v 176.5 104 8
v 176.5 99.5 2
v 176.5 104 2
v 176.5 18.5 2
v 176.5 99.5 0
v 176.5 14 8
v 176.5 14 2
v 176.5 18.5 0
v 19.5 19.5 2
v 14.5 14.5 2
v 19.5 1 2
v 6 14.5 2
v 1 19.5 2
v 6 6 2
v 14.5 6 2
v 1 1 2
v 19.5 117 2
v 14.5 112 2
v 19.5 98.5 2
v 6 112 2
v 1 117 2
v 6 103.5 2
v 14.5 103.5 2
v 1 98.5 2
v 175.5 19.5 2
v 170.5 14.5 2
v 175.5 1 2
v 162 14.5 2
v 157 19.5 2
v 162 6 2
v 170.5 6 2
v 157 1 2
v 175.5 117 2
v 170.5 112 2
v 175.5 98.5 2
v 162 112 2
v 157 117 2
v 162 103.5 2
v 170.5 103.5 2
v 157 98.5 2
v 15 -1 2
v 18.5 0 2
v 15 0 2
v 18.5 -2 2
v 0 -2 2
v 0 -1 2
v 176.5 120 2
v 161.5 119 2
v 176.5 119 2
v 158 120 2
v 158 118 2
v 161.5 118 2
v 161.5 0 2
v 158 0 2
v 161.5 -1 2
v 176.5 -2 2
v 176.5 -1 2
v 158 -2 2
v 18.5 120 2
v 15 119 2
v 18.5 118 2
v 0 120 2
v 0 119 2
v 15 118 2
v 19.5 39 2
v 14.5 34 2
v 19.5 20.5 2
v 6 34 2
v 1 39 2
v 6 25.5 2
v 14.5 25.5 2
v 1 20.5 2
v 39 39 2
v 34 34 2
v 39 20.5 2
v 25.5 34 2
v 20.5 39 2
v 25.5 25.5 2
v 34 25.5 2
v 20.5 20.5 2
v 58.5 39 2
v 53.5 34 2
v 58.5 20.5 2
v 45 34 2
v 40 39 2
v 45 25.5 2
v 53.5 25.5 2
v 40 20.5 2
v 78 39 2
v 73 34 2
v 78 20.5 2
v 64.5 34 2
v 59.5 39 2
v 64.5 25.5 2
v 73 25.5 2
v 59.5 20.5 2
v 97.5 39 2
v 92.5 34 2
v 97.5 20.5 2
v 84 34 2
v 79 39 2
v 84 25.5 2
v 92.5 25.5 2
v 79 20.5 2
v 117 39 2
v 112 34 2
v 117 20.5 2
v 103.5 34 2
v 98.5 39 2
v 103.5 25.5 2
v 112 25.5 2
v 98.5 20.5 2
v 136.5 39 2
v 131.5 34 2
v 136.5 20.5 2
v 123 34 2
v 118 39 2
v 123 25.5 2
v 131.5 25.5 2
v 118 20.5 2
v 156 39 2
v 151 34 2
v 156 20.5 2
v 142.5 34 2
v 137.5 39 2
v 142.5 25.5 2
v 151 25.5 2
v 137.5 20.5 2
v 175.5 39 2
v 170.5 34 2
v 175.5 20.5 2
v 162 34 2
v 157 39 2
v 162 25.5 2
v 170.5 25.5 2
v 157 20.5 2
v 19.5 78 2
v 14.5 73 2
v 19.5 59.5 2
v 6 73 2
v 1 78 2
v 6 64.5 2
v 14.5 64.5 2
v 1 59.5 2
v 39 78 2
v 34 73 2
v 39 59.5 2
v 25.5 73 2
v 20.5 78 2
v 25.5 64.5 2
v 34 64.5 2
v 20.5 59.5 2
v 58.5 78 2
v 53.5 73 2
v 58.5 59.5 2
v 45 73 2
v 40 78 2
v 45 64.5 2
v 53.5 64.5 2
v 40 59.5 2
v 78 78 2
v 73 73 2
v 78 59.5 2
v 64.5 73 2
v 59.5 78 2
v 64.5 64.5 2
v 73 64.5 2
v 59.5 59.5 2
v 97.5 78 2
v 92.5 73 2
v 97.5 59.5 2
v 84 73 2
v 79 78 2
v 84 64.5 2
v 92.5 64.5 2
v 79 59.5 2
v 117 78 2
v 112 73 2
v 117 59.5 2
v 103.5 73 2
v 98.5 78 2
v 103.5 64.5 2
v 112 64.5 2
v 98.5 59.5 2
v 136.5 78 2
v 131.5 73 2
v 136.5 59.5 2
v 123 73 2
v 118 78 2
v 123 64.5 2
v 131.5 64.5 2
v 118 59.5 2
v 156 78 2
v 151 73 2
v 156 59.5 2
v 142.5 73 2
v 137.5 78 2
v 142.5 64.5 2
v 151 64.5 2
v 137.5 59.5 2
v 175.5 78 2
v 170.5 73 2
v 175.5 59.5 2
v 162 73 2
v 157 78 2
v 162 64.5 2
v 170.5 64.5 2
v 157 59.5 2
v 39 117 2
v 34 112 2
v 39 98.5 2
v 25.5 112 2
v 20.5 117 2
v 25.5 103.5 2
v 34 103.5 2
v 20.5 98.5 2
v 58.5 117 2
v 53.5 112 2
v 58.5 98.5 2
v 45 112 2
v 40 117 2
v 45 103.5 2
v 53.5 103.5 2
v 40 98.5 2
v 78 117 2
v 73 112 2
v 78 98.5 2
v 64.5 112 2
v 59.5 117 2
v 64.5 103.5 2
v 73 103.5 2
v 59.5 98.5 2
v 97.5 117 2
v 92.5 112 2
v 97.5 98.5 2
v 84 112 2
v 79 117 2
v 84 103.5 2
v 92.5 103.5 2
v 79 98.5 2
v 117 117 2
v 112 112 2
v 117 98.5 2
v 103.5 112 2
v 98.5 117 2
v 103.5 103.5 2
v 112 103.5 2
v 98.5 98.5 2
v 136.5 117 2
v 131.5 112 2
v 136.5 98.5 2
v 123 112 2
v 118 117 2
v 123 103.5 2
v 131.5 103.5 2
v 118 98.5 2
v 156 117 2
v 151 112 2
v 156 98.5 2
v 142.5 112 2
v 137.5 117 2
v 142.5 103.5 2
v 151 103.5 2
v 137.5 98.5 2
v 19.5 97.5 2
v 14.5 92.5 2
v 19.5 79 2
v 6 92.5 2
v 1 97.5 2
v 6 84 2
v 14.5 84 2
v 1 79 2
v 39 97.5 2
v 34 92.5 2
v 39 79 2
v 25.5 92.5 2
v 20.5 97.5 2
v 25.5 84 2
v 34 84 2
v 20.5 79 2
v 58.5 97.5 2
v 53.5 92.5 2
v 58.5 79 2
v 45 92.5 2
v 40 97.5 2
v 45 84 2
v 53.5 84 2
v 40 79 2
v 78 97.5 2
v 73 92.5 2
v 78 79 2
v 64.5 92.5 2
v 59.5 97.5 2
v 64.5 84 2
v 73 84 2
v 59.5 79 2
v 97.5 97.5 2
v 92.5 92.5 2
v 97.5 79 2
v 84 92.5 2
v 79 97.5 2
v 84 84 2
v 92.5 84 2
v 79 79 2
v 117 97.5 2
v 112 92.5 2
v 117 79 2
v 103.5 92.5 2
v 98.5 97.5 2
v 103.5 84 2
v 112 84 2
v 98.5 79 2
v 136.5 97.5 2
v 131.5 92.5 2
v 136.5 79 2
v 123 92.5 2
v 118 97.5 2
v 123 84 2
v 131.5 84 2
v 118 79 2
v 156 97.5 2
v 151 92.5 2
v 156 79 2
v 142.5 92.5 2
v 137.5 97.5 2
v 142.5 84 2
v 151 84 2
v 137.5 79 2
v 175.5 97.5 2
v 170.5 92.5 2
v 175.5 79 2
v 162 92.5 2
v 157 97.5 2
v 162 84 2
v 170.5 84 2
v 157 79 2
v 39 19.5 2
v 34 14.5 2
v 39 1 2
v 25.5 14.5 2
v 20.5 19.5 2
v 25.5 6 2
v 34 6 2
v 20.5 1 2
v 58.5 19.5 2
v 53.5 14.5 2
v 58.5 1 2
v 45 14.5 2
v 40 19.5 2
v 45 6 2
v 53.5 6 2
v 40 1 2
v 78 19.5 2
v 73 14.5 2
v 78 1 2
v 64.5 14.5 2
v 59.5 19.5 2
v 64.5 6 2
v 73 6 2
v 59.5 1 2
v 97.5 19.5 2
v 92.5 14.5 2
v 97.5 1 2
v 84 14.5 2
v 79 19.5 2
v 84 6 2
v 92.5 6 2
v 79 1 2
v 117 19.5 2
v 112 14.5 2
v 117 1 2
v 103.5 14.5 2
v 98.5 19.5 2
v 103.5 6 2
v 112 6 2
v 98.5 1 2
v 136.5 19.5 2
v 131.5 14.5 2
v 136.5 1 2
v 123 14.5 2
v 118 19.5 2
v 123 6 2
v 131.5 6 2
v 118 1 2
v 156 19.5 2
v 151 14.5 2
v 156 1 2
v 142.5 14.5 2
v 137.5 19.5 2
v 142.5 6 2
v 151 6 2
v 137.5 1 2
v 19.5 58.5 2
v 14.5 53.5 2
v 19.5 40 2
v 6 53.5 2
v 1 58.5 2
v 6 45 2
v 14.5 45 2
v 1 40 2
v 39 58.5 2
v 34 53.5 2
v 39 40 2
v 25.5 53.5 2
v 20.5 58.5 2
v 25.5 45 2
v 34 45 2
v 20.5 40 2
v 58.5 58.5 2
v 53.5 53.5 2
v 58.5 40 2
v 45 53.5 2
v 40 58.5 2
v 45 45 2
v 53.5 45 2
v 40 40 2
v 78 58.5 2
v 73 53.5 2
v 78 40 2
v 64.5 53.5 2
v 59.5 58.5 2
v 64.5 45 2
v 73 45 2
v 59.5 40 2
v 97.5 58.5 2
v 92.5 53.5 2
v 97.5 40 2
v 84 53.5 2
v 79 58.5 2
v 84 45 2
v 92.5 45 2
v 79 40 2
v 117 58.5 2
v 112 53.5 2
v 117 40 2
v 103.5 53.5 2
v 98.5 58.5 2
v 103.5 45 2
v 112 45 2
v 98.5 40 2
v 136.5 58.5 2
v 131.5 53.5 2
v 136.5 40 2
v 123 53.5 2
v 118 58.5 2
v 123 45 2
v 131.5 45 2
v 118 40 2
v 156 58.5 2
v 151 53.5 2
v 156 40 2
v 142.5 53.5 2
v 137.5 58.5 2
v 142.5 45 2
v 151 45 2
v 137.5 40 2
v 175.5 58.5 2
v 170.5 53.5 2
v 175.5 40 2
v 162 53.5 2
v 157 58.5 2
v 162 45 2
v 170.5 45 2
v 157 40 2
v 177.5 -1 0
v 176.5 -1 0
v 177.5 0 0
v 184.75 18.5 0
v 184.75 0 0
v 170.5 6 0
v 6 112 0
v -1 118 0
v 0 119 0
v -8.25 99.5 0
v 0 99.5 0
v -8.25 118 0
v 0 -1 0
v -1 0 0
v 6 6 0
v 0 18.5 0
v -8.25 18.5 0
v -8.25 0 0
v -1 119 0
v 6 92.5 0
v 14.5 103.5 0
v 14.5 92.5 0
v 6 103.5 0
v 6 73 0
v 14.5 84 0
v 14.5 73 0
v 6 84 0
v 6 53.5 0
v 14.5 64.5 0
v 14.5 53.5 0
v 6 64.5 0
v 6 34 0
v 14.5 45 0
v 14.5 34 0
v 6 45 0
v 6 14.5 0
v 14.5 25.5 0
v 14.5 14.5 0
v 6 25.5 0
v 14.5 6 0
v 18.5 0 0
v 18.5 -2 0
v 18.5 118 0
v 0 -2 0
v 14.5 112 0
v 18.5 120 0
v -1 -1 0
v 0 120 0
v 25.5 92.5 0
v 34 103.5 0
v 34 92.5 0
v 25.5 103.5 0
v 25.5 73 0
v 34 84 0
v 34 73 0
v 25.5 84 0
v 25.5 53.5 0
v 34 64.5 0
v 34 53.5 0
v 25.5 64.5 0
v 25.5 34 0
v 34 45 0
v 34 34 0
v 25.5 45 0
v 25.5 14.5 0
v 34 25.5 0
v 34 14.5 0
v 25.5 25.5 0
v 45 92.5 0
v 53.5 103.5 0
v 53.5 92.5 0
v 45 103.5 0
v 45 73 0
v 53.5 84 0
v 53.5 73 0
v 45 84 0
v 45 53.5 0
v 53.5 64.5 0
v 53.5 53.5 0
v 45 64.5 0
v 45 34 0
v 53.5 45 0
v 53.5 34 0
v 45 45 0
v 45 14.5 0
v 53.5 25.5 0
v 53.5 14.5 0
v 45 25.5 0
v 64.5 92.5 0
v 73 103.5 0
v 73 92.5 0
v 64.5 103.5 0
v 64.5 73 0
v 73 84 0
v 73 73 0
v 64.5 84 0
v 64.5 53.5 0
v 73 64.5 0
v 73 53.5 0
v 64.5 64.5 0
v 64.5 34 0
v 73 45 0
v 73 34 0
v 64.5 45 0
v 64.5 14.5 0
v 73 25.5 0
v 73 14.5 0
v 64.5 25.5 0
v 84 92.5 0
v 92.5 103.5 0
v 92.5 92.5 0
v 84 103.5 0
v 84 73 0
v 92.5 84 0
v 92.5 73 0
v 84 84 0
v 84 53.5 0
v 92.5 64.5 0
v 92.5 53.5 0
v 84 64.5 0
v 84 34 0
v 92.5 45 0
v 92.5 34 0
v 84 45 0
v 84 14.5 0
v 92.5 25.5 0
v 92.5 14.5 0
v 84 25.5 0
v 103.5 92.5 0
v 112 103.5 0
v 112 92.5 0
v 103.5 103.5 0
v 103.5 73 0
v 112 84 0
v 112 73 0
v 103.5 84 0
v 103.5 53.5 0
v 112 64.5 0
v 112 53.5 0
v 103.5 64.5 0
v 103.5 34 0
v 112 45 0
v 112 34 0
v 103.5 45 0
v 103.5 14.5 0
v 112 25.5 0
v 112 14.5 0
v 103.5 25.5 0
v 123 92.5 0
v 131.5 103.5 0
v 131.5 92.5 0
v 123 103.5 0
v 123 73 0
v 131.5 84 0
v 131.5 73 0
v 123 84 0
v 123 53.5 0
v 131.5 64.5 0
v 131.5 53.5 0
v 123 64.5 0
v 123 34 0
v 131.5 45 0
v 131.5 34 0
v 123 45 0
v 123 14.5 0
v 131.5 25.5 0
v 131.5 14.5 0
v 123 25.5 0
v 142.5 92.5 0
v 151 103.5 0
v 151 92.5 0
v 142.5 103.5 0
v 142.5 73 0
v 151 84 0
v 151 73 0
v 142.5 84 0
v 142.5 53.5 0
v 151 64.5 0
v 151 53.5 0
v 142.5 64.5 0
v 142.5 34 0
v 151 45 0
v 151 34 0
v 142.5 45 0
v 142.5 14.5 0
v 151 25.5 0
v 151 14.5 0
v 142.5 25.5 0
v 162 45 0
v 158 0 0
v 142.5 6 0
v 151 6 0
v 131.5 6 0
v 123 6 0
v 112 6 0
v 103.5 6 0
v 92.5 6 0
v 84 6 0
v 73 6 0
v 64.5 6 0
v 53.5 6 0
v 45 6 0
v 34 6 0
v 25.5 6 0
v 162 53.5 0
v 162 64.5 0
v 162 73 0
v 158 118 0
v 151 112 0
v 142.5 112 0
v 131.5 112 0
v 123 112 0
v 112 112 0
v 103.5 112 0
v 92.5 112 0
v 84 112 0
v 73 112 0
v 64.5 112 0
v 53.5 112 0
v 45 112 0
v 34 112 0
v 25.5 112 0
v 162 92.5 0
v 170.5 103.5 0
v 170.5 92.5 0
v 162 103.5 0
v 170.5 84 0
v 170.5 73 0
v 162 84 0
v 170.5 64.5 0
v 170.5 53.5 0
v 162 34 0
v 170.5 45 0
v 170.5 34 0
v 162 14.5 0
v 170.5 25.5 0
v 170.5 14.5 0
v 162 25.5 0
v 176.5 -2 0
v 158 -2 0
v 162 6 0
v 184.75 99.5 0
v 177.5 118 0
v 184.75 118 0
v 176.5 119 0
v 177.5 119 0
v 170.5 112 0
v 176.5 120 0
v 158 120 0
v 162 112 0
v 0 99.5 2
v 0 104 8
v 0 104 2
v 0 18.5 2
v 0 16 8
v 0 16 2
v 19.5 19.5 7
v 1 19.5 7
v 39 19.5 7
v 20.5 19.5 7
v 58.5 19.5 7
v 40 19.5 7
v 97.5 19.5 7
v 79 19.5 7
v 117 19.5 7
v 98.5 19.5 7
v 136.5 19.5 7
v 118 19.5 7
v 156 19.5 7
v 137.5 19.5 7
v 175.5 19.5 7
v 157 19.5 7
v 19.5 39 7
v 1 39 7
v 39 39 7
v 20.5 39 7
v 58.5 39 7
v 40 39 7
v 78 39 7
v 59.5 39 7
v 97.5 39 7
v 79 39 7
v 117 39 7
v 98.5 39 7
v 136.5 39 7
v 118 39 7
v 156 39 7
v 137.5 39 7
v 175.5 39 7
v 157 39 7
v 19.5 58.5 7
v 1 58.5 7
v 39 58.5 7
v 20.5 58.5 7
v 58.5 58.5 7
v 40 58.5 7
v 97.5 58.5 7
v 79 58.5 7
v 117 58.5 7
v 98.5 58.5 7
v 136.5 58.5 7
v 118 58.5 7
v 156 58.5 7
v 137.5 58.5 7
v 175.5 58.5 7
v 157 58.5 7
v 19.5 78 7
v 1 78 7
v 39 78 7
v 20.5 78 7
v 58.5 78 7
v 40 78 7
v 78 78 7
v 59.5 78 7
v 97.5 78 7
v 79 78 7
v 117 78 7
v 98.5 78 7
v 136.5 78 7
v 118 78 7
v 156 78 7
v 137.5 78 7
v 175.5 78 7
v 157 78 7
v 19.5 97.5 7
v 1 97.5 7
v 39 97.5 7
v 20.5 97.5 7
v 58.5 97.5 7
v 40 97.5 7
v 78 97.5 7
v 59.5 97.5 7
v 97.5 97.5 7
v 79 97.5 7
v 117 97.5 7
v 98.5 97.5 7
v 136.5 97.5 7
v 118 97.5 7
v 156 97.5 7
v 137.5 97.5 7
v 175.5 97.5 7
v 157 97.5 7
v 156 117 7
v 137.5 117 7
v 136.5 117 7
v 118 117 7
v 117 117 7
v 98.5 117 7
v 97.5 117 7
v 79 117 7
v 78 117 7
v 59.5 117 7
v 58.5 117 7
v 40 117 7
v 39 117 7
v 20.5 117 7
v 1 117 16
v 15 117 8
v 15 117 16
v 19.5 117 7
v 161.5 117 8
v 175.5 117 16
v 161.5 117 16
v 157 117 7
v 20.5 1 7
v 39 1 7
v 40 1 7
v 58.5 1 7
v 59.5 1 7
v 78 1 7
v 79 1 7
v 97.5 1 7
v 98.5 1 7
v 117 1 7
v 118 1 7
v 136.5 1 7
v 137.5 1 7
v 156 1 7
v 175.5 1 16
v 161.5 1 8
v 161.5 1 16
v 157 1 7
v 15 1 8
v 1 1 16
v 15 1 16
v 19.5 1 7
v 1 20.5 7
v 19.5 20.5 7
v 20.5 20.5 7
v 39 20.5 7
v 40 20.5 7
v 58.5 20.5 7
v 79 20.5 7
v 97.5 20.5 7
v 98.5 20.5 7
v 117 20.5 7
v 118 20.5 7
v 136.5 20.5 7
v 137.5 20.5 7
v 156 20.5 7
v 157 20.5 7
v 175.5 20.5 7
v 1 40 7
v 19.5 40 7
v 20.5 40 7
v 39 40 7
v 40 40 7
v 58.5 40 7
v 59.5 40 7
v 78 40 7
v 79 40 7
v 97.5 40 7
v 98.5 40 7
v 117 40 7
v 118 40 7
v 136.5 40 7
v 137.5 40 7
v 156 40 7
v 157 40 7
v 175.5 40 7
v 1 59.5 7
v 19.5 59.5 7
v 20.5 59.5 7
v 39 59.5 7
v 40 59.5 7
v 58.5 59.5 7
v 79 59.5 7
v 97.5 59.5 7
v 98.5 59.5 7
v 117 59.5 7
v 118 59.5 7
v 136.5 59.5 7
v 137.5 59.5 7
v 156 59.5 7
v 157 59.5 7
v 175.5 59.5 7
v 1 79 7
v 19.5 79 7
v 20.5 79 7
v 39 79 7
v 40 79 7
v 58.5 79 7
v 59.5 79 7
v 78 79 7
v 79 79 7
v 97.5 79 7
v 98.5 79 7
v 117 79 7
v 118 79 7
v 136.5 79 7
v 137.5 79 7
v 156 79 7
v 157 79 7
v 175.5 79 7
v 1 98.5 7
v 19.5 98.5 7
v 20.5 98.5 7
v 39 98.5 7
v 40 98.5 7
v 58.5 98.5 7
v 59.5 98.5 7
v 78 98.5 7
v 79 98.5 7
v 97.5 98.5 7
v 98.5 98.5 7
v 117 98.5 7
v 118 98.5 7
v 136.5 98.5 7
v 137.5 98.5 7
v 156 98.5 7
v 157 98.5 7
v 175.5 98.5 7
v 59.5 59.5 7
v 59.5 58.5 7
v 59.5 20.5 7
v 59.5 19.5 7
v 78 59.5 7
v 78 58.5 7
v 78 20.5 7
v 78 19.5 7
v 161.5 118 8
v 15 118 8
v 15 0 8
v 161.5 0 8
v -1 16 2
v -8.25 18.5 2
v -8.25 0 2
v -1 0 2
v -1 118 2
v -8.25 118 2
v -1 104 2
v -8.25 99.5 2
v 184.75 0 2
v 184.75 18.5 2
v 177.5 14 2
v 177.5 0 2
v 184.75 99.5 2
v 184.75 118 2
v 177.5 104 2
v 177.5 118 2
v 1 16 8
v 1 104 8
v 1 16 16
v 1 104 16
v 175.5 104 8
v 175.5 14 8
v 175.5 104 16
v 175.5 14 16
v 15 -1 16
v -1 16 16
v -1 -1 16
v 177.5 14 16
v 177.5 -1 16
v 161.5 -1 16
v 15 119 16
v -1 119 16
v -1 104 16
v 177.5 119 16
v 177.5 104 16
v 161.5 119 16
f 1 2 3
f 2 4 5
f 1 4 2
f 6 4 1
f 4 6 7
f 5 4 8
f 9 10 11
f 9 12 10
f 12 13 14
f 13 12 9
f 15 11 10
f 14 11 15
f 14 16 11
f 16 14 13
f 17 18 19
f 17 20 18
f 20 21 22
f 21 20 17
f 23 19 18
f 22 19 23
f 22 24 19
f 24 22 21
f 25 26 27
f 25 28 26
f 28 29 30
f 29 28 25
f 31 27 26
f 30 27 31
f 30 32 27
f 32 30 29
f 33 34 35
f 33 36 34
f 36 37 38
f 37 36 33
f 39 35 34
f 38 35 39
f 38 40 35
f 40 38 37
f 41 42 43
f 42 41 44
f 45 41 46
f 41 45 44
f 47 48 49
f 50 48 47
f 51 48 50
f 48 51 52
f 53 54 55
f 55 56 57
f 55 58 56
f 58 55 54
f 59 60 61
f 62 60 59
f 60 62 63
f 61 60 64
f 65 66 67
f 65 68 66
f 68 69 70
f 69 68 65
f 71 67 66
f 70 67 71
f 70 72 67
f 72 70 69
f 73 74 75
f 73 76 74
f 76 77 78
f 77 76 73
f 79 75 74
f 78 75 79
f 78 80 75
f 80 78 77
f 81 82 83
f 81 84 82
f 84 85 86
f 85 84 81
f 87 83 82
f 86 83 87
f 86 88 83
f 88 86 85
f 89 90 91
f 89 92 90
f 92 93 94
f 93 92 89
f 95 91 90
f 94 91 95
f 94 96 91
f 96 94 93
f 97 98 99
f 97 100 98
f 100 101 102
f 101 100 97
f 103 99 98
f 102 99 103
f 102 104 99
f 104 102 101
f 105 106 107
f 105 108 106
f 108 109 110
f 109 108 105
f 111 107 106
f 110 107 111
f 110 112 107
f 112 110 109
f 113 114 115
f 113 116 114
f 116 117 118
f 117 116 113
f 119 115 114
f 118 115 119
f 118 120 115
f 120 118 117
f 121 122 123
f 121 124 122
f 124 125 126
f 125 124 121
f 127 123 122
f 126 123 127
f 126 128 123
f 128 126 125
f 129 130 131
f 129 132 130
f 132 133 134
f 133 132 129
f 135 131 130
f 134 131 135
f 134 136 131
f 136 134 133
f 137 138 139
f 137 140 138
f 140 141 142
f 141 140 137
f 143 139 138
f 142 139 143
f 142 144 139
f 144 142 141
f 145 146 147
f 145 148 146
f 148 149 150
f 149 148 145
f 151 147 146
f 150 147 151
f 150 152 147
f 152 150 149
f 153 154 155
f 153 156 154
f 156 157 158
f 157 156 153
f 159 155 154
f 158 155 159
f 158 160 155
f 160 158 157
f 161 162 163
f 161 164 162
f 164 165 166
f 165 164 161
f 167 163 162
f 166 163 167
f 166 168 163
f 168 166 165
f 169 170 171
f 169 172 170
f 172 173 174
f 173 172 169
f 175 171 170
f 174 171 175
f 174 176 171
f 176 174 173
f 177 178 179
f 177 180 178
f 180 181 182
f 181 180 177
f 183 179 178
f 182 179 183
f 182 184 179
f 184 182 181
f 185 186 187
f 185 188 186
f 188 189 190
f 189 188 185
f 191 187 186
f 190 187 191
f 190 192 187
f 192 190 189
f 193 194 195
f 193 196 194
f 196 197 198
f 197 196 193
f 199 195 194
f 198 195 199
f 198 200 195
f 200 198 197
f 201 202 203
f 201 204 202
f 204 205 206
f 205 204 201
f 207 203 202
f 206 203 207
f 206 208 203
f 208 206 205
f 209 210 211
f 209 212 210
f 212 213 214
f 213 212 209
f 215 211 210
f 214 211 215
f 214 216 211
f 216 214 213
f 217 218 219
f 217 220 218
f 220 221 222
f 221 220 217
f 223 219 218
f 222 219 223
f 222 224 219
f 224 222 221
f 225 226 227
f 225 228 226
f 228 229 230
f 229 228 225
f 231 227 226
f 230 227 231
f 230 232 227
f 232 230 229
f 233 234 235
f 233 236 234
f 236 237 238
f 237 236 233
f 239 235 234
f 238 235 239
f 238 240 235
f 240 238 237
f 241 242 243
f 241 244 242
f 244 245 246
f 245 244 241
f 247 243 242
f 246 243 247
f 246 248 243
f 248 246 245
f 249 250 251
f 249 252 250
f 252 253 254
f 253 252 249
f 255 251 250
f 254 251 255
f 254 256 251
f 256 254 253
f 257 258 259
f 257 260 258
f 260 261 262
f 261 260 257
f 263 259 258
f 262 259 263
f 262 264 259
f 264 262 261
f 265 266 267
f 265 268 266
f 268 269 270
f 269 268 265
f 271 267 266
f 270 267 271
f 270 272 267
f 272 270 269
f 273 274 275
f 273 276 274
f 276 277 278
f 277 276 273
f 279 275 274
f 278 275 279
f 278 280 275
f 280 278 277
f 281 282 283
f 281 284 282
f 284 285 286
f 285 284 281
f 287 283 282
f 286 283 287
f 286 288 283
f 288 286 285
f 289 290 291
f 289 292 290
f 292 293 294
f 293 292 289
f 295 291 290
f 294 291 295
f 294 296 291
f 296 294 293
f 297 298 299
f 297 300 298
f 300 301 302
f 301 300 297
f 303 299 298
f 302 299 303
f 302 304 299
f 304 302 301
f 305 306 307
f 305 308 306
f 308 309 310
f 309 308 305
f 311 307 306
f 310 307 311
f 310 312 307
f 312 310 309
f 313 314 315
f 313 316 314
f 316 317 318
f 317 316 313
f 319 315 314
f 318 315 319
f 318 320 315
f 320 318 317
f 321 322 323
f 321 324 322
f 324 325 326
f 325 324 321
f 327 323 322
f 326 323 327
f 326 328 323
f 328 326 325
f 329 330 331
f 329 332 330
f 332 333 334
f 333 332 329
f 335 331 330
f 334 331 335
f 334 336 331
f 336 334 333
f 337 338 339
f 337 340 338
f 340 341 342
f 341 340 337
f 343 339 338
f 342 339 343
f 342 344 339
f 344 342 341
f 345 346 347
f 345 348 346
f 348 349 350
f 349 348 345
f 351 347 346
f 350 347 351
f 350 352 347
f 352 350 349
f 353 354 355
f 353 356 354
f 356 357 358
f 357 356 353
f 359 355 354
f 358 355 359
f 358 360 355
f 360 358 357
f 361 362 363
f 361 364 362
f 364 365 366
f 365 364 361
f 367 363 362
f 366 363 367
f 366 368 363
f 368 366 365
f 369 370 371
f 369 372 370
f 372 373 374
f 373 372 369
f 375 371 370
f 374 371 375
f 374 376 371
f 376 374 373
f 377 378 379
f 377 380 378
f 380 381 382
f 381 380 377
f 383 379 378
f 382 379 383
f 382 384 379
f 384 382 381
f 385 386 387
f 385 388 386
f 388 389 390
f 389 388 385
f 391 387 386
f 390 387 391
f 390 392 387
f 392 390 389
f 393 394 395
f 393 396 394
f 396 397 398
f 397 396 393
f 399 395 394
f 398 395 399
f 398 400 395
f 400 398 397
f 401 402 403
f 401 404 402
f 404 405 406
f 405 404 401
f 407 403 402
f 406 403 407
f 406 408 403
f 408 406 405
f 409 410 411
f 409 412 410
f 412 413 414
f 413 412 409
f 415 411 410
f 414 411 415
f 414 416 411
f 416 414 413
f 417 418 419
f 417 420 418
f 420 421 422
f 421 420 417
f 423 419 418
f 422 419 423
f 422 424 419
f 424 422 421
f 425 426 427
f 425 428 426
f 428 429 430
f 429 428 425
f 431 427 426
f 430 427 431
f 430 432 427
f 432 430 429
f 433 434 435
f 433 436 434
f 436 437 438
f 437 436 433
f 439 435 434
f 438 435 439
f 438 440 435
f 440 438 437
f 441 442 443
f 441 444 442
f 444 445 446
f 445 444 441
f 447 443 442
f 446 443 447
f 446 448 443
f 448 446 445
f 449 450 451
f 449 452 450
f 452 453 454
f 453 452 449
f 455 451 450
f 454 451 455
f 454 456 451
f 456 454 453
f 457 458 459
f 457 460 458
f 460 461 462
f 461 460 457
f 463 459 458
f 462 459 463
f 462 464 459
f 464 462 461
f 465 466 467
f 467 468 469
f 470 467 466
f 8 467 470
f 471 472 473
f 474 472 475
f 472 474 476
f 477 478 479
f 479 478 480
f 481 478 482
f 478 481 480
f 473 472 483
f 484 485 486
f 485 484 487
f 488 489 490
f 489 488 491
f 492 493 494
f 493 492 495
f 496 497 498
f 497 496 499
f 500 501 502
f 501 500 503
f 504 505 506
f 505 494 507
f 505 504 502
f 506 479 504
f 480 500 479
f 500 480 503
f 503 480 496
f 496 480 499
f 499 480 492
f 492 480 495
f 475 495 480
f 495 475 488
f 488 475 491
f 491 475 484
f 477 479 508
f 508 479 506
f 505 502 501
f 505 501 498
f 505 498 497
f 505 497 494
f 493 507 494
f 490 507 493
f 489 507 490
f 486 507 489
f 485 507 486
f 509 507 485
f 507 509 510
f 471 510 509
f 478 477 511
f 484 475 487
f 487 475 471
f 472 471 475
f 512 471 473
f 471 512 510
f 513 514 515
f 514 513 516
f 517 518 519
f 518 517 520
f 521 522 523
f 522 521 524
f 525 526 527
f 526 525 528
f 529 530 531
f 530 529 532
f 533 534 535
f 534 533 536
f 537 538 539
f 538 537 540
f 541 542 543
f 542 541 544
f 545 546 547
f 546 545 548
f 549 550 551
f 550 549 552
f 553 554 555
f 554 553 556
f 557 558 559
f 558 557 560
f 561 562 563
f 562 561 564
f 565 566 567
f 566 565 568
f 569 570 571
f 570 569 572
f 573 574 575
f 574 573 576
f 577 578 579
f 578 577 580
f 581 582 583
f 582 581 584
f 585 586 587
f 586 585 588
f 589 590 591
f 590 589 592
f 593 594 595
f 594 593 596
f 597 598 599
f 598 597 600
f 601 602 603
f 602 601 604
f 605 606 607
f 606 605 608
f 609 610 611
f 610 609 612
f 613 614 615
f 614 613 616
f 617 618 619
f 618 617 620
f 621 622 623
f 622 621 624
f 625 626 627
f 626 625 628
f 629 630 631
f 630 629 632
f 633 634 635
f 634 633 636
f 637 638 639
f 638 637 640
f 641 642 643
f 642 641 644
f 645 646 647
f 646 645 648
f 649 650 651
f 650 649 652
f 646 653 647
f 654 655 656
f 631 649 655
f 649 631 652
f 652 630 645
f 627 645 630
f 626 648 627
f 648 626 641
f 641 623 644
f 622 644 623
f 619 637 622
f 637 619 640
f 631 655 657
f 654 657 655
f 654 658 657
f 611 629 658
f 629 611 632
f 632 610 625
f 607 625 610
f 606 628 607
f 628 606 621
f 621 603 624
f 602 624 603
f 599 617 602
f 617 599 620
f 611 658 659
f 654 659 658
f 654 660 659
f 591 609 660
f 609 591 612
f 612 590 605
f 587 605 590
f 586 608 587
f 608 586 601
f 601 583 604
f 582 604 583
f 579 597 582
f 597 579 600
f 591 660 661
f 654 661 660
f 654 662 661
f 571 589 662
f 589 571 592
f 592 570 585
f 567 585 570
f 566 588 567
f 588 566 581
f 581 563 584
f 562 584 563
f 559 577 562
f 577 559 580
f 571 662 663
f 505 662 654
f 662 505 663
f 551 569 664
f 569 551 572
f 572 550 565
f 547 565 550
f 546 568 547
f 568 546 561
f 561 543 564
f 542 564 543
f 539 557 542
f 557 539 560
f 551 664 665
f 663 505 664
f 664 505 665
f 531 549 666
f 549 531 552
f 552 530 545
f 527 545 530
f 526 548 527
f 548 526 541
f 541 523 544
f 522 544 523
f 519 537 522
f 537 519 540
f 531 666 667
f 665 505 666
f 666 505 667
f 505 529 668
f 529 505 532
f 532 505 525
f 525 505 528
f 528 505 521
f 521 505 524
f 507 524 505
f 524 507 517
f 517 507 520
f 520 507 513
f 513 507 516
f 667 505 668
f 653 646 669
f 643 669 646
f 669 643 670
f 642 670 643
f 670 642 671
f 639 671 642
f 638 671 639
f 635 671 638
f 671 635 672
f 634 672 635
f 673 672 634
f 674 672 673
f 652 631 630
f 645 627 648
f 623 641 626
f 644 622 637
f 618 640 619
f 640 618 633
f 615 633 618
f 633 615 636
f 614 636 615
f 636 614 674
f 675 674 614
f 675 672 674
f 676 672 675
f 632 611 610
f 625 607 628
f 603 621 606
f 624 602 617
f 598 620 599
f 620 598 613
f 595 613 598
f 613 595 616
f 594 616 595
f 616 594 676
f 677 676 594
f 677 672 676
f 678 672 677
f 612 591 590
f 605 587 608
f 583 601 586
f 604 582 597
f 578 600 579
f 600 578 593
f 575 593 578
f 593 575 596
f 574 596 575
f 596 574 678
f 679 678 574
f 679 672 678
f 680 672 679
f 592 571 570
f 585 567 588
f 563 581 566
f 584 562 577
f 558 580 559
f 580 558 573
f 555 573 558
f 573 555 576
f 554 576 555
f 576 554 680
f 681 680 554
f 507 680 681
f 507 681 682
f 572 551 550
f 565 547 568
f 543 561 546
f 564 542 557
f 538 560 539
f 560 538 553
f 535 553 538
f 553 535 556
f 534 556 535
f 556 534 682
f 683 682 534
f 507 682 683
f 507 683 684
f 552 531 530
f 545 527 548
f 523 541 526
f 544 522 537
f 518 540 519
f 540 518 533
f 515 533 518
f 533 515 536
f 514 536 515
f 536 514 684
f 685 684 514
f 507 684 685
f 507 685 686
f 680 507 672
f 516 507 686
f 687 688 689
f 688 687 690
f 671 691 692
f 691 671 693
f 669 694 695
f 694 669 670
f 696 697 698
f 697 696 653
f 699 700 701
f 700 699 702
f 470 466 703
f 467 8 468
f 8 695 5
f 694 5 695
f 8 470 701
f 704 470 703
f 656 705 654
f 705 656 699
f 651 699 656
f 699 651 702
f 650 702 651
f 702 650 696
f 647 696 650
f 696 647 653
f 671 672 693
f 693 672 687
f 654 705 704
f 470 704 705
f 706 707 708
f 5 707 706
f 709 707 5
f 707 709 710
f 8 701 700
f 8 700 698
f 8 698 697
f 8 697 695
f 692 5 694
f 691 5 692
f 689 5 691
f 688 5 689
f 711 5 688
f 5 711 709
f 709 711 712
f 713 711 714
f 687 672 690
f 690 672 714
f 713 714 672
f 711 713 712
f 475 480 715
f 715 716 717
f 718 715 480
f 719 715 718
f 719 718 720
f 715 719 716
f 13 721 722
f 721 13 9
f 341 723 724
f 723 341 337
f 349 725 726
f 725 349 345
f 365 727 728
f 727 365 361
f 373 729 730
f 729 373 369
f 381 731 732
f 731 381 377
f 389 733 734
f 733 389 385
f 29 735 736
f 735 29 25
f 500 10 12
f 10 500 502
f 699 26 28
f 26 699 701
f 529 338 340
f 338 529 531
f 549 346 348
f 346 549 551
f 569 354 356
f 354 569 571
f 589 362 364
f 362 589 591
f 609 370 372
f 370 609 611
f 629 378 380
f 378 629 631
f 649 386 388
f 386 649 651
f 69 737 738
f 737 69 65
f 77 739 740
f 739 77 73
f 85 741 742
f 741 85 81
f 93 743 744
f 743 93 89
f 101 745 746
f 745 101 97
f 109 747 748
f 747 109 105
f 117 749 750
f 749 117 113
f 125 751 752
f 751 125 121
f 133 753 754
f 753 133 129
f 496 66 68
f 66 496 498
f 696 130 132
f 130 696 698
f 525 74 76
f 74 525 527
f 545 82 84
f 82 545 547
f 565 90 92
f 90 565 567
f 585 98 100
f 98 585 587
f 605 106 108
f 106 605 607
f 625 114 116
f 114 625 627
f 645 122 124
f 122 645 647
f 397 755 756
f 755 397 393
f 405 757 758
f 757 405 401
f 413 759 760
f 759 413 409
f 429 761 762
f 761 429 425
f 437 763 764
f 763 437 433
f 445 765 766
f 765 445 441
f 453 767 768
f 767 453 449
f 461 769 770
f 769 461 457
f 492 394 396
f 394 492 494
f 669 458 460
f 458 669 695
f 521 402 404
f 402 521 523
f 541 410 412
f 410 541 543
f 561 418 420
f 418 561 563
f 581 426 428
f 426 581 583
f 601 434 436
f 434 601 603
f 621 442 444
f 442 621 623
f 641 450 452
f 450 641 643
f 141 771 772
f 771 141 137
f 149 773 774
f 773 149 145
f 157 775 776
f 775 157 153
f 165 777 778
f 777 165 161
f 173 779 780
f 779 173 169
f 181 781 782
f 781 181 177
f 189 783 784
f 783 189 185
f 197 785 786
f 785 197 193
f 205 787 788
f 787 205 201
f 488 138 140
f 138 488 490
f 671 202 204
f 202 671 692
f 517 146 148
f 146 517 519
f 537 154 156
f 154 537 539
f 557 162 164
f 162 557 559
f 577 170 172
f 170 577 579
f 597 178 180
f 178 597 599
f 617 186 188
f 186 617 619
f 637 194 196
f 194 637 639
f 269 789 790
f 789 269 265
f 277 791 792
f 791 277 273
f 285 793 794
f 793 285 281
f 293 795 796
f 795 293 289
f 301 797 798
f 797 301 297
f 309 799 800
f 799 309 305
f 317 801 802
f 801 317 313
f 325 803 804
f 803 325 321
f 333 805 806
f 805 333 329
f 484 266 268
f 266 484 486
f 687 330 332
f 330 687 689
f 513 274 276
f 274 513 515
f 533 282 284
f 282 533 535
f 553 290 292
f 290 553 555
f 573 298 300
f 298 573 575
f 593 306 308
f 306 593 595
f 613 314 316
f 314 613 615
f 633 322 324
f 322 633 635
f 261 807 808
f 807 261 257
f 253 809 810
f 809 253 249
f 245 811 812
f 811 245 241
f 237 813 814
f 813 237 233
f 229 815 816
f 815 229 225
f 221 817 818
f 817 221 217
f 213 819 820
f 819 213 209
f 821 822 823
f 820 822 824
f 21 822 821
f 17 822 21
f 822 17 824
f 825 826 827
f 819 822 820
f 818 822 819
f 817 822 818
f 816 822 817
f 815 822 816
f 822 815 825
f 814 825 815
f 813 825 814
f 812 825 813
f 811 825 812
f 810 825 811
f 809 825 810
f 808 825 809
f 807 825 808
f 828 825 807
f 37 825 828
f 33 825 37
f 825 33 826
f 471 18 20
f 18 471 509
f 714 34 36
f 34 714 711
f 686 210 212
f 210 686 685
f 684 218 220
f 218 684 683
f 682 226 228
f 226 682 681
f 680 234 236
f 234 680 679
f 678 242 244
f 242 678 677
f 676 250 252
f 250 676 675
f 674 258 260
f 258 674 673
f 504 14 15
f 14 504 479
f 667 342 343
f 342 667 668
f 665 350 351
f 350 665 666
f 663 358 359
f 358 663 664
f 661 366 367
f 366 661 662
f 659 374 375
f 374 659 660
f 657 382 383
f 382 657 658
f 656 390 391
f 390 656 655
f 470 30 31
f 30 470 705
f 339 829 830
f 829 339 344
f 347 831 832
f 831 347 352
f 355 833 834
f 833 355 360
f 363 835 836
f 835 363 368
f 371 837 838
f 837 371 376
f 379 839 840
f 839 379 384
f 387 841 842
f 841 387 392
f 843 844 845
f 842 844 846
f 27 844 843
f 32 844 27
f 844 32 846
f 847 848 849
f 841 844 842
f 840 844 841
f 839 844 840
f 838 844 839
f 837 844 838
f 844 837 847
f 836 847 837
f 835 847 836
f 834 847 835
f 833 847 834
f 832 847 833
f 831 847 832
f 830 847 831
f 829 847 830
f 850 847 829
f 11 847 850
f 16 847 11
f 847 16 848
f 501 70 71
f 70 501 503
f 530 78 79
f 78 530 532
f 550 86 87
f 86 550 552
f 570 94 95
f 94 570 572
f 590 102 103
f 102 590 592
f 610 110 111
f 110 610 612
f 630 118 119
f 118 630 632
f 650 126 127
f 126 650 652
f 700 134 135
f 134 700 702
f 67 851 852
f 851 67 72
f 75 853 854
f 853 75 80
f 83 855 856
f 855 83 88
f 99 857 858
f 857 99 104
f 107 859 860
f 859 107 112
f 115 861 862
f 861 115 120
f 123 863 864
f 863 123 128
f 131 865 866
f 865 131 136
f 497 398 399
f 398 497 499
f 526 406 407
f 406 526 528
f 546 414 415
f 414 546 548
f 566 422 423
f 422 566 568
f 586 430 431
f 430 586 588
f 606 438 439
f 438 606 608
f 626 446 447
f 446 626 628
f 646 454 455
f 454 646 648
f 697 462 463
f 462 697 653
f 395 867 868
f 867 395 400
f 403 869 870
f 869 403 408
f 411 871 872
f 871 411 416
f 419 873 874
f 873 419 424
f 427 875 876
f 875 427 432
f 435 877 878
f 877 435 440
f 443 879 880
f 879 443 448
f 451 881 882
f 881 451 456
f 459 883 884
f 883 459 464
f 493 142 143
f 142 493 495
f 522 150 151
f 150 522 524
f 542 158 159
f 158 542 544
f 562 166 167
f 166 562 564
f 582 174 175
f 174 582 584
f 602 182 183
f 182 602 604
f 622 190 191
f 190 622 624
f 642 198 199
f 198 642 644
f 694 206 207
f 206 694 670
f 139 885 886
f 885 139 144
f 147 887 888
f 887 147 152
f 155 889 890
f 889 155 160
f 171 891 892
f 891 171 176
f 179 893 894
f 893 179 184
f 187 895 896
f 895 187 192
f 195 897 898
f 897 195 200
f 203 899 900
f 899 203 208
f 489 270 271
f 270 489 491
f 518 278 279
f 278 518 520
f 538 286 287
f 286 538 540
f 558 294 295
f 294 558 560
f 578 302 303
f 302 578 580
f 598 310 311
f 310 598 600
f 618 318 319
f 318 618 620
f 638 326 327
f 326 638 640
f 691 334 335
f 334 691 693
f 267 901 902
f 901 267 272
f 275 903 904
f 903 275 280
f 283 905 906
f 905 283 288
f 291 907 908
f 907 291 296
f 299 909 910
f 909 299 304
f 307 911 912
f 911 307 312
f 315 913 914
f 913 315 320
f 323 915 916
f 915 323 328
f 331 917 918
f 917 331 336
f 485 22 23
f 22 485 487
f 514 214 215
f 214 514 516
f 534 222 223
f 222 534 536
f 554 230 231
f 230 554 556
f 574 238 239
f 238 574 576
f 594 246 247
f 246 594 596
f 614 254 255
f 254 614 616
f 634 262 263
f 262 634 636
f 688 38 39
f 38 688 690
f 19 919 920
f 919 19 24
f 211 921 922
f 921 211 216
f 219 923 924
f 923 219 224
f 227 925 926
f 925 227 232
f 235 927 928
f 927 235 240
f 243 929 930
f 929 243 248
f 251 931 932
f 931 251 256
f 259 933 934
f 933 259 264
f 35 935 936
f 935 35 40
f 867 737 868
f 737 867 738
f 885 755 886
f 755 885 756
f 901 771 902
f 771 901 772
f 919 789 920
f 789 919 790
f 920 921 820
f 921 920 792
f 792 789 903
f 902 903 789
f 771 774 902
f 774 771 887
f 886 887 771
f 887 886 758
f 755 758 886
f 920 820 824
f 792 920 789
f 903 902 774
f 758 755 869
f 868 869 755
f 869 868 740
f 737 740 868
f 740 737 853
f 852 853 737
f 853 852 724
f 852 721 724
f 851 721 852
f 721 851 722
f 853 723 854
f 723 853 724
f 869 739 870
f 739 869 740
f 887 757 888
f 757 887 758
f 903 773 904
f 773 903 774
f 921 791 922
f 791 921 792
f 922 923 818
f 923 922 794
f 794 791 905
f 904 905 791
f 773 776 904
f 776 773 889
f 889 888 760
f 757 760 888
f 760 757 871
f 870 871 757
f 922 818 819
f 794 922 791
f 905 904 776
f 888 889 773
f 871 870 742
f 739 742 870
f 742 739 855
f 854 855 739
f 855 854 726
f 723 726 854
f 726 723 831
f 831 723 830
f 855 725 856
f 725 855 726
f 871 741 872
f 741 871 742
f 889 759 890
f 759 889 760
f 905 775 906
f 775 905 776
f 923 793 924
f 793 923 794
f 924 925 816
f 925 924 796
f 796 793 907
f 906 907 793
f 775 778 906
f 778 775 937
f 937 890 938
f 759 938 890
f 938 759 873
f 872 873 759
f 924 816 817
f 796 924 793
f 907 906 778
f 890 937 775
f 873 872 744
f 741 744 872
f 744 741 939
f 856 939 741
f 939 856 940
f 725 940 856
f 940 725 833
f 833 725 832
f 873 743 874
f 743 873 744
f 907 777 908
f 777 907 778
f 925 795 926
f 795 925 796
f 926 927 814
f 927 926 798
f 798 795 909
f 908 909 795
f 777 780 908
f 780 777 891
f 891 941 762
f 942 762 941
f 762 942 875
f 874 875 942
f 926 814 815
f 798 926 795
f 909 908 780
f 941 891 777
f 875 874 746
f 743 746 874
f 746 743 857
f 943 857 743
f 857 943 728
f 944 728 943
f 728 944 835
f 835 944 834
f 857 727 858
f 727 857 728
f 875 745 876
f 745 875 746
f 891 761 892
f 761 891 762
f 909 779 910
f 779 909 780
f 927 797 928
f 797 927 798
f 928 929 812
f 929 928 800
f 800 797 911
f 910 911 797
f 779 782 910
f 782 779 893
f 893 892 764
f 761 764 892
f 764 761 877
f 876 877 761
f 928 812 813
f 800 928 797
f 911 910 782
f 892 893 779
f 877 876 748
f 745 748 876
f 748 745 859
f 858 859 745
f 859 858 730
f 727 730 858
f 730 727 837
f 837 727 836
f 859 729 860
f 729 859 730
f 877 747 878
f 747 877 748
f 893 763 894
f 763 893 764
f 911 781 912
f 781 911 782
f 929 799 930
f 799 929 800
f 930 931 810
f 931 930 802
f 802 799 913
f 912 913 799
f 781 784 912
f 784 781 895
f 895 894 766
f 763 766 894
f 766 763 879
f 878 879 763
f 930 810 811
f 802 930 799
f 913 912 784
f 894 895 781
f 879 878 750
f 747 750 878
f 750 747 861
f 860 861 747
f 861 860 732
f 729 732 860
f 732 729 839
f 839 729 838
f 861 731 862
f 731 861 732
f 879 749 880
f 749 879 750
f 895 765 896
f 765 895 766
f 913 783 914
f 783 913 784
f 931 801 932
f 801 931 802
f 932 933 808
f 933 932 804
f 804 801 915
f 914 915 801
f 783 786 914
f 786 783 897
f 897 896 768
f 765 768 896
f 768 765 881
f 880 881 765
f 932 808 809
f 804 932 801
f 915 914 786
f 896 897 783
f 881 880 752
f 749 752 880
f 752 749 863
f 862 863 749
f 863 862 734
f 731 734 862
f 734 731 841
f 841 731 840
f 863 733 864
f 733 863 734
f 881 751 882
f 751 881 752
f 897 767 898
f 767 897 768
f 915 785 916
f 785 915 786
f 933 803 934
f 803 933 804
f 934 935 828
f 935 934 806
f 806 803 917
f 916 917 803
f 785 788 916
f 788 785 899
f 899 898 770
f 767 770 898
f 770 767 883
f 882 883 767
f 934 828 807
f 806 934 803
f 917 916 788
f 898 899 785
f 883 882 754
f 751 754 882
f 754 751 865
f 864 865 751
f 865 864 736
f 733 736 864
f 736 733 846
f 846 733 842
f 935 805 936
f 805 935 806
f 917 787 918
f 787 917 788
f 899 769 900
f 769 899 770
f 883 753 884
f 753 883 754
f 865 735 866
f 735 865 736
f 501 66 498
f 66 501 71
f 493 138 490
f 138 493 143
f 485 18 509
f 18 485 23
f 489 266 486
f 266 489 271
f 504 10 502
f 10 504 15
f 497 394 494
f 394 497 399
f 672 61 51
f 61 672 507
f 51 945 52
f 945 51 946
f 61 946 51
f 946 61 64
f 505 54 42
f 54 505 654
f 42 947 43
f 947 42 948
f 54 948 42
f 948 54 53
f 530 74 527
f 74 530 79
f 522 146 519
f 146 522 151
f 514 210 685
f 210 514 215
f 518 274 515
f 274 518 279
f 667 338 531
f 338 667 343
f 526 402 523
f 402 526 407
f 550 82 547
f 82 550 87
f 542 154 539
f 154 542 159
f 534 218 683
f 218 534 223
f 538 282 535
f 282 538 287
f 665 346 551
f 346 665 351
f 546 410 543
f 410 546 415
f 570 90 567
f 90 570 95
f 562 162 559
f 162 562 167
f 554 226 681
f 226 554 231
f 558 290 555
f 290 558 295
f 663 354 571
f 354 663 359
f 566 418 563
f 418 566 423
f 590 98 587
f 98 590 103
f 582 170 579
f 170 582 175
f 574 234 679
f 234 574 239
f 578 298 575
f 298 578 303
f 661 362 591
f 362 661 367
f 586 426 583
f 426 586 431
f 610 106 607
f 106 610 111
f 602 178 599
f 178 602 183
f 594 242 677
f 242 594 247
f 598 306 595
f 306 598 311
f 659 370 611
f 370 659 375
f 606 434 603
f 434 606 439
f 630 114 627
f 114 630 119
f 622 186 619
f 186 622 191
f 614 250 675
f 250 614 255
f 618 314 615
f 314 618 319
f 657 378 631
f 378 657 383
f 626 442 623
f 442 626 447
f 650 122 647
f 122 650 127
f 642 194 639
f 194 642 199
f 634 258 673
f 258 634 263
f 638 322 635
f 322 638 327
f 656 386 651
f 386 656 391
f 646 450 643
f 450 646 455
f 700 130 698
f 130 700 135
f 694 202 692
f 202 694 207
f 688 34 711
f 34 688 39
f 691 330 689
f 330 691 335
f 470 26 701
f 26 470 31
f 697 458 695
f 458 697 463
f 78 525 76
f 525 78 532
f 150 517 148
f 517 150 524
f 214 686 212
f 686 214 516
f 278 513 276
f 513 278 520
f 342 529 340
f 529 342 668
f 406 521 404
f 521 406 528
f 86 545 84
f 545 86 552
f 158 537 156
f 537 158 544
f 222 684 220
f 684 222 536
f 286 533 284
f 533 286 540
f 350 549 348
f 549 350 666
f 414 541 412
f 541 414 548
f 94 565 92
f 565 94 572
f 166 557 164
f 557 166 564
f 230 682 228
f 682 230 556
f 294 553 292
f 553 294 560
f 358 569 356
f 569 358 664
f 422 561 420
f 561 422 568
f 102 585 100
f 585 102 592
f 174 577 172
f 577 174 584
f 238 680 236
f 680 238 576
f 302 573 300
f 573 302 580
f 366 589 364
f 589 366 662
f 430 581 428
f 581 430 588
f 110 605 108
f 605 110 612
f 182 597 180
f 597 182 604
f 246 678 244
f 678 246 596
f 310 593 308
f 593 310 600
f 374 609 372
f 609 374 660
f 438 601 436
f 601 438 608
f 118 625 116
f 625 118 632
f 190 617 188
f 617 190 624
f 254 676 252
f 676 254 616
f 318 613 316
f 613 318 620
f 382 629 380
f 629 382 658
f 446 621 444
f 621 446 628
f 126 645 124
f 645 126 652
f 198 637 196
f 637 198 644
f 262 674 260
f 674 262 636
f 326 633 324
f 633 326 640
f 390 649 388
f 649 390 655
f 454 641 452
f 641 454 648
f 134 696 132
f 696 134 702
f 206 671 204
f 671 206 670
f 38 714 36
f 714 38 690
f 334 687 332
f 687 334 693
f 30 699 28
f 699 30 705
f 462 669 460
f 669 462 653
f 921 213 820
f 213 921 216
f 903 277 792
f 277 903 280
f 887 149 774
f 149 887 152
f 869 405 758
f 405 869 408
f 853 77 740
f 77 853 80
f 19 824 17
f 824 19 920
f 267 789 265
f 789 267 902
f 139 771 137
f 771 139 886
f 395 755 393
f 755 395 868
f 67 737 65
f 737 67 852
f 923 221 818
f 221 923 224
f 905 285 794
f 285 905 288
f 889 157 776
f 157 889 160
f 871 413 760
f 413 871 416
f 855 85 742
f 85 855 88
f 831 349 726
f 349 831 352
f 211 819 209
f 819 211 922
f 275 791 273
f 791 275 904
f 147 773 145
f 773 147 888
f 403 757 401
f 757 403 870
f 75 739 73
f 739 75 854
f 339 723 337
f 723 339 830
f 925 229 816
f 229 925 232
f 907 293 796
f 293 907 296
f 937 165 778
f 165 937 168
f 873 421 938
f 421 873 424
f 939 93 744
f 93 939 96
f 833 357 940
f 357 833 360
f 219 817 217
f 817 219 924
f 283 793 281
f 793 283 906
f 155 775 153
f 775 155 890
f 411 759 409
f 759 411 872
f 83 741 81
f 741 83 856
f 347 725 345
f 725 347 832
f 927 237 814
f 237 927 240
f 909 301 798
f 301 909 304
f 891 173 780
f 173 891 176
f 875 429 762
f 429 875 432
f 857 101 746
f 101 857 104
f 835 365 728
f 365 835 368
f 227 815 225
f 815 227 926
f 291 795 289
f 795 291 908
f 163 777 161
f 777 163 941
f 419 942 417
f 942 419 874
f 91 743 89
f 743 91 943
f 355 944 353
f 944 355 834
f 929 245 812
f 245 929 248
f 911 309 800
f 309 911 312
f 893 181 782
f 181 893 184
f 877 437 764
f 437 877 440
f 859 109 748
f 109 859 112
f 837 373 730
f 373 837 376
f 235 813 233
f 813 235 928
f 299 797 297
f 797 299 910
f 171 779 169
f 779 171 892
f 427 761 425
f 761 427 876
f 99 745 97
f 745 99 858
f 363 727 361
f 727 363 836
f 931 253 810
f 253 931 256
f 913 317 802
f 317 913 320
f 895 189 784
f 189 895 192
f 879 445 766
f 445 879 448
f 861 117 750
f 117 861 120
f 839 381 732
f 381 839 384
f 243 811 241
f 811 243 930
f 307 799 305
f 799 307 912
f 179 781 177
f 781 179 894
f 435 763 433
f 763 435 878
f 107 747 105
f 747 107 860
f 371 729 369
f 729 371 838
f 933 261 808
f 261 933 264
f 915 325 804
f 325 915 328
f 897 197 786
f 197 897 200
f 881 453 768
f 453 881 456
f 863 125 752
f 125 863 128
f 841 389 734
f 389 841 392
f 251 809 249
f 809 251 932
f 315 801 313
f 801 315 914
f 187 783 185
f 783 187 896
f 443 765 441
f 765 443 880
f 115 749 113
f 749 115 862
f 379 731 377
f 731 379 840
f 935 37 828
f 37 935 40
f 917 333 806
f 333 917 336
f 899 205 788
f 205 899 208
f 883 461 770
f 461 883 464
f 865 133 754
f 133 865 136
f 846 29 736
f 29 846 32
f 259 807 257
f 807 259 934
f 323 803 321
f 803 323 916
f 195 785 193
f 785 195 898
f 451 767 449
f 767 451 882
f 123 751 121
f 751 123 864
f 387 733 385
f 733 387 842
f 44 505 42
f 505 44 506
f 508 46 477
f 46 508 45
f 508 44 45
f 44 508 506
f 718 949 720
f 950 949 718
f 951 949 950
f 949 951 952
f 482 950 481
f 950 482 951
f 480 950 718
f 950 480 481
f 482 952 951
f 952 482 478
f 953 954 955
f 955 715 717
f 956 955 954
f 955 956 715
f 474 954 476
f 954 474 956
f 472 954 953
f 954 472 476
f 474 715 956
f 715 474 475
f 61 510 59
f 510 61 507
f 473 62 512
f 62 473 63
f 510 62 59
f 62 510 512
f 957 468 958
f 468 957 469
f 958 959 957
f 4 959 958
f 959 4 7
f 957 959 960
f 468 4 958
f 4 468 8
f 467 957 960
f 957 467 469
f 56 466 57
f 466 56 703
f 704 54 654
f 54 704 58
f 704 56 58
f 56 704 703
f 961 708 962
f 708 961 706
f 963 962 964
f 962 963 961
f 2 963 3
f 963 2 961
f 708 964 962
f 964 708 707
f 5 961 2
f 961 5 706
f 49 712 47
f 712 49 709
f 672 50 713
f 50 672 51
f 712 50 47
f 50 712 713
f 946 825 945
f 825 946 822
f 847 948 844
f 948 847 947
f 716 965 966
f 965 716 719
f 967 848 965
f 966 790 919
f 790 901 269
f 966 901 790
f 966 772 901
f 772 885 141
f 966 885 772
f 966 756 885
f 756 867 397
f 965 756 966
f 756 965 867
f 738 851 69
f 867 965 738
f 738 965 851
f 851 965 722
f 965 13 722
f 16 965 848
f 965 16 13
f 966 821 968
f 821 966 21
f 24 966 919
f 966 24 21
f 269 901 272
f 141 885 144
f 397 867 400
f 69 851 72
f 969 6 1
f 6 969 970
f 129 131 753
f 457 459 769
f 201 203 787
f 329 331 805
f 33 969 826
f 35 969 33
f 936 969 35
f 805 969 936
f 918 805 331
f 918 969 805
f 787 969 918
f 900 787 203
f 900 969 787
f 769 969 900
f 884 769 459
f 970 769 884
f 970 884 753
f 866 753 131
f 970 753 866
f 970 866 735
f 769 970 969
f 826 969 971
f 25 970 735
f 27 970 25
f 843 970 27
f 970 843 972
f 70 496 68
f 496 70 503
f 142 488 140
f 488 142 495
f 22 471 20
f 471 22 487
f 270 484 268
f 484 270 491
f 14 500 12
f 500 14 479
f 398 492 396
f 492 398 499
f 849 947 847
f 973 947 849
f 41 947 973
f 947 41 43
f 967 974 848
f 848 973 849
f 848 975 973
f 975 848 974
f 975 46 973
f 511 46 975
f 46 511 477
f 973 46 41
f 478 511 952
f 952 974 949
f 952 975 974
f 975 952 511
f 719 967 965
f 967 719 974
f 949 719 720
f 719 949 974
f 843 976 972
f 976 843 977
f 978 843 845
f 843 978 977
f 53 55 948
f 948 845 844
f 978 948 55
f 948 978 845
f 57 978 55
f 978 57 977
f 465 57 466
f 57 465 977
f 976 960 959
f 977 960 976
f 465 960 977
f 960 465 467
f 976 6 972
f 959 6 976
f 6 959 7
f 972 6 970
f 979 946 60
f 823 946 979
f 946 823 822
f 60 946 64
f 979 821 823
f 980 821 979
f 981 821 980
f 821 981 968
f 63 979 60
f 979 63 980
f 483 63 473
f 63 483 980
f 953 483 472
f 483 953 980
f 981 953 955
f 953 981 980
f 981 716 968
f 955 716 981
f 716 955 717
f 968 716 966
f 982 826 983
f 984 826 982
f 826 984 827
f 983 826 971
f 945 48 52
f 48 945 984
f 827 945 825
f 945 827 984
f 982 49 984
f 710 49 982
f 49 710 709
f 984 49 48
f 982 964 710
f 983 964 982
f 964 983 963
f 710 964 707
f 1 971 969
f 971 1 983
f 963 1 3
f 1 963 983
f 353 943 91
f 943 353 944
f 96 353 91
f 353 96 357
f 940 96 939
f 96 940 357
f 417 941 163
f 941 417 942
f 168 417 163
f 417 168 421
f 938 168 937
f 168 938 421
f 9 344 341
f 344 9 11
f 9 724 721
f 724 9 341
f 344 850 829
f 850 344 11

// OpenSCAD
// 鍵帽儲存托盤產生器
// Keycap Storage Tray Generator
include <KSTG_Base.SCAD>

// 可複製此樣板檔依照自己需求另存新檔
// 以便以檔案區隔樣式

// 存放盒子的大小:
BoxSize_L1 = 193; //長度(水平)
BoxSize_W1 = 122; //寬度(垂直)
BoxSize_H = 55;  //高度

// 外圍厚度
Tray_Fence_T = 1;  //厚度
Tray_Fence_H = 6;  //高度

// 分隔片
Tray_Separator_T = 1;  //厚度
Tray_Separator_H = 5;  //高度 要高於上一層與鍵帽間的間隙
Tray_Separator_L = 3;  //短隔板長度

// 分隔片(長寬區分/尚未使用)
//Tray_Separator_T_L = 1;  //長(水平) 厚度
//Tray_Separator_T_W = 2;  //寬(垂直) 厚度
//Tray_Separator_H_L = 5;  //長(水平) 高度
//Tray_Separator_H_W = 5;  //寬(垂直) 高度

// 底板
Tray_Bottom_L = 5; //底部分隔板至到底板寬度
Tray_Bottom_T = 2; //底板厚度

//常見鍵帽高度表:
//SA  16.5mm  Cherry 9.4mm
//OEM 11.9mm  TAI HAO 14.8
//XDA 9.1mm   DSA 7.6
//ADA 8mm (18.2x18.2mm )
//適用於 Tray_Column_H 參數

//四角落立柱高度
//堆疊托盤時可墊高避免直接碰觸鍵帽
Tray_Column_H = 14; // 高度 可依照鍵帽高度調整
Tray_Column_T = 2;  // 厚度
Tray_Column_L = 15; // 長面長度
Tray_Column_W = 15; // 寬面長度 

//放置鍵帽空間
Keycaps_Space_L = 18.5;
Keycaps_Space_W = 18.5;

//垂直分隔片樣式
// 0 不需要
// 1 全部
// 2 短隔板無底板
// 3 短隔板有底板

Tray_VS_Type = 1;

//多餘空間處理方式
//How to use the extra space
// 0 不處理，照原本盒子大小產生外圍
// 1 不處理，僅列印鍵帽所需空間
// 2 角落填補剩餘空間
ExtraSpaceUse = 2;

//是否顯示文字標記 0關/1開
ShowText = 1 ;

//清除分隔片與底板
//請參考F5後帶出的座標數值
//例如：
// Tray_Separator_Cut_L=[
// [1,1],[2,1],[3,1],[1,2]
// ];

// 長(水平)分隔片 紅色
Tray_Separator_Cut_L=[
[4,1],[4,3]
];
// 寬(垂直)分隔片 藍色 -vnm,     
Tray_Separator_Cut_W=[
[1,1]
];
// 交錯點 綠色 長寬分隔片交會處
// 須手動清除交錯點
Tray_Separator_Cut_C=[
];
// 長(水平)底板 紅色
Tray_Separator_Cut_LB=[
[4,1],[4,3]
];
// 寬(垂直)底板 藍色
Tray_Separator_Cut_WB=[
[1,1]
];
